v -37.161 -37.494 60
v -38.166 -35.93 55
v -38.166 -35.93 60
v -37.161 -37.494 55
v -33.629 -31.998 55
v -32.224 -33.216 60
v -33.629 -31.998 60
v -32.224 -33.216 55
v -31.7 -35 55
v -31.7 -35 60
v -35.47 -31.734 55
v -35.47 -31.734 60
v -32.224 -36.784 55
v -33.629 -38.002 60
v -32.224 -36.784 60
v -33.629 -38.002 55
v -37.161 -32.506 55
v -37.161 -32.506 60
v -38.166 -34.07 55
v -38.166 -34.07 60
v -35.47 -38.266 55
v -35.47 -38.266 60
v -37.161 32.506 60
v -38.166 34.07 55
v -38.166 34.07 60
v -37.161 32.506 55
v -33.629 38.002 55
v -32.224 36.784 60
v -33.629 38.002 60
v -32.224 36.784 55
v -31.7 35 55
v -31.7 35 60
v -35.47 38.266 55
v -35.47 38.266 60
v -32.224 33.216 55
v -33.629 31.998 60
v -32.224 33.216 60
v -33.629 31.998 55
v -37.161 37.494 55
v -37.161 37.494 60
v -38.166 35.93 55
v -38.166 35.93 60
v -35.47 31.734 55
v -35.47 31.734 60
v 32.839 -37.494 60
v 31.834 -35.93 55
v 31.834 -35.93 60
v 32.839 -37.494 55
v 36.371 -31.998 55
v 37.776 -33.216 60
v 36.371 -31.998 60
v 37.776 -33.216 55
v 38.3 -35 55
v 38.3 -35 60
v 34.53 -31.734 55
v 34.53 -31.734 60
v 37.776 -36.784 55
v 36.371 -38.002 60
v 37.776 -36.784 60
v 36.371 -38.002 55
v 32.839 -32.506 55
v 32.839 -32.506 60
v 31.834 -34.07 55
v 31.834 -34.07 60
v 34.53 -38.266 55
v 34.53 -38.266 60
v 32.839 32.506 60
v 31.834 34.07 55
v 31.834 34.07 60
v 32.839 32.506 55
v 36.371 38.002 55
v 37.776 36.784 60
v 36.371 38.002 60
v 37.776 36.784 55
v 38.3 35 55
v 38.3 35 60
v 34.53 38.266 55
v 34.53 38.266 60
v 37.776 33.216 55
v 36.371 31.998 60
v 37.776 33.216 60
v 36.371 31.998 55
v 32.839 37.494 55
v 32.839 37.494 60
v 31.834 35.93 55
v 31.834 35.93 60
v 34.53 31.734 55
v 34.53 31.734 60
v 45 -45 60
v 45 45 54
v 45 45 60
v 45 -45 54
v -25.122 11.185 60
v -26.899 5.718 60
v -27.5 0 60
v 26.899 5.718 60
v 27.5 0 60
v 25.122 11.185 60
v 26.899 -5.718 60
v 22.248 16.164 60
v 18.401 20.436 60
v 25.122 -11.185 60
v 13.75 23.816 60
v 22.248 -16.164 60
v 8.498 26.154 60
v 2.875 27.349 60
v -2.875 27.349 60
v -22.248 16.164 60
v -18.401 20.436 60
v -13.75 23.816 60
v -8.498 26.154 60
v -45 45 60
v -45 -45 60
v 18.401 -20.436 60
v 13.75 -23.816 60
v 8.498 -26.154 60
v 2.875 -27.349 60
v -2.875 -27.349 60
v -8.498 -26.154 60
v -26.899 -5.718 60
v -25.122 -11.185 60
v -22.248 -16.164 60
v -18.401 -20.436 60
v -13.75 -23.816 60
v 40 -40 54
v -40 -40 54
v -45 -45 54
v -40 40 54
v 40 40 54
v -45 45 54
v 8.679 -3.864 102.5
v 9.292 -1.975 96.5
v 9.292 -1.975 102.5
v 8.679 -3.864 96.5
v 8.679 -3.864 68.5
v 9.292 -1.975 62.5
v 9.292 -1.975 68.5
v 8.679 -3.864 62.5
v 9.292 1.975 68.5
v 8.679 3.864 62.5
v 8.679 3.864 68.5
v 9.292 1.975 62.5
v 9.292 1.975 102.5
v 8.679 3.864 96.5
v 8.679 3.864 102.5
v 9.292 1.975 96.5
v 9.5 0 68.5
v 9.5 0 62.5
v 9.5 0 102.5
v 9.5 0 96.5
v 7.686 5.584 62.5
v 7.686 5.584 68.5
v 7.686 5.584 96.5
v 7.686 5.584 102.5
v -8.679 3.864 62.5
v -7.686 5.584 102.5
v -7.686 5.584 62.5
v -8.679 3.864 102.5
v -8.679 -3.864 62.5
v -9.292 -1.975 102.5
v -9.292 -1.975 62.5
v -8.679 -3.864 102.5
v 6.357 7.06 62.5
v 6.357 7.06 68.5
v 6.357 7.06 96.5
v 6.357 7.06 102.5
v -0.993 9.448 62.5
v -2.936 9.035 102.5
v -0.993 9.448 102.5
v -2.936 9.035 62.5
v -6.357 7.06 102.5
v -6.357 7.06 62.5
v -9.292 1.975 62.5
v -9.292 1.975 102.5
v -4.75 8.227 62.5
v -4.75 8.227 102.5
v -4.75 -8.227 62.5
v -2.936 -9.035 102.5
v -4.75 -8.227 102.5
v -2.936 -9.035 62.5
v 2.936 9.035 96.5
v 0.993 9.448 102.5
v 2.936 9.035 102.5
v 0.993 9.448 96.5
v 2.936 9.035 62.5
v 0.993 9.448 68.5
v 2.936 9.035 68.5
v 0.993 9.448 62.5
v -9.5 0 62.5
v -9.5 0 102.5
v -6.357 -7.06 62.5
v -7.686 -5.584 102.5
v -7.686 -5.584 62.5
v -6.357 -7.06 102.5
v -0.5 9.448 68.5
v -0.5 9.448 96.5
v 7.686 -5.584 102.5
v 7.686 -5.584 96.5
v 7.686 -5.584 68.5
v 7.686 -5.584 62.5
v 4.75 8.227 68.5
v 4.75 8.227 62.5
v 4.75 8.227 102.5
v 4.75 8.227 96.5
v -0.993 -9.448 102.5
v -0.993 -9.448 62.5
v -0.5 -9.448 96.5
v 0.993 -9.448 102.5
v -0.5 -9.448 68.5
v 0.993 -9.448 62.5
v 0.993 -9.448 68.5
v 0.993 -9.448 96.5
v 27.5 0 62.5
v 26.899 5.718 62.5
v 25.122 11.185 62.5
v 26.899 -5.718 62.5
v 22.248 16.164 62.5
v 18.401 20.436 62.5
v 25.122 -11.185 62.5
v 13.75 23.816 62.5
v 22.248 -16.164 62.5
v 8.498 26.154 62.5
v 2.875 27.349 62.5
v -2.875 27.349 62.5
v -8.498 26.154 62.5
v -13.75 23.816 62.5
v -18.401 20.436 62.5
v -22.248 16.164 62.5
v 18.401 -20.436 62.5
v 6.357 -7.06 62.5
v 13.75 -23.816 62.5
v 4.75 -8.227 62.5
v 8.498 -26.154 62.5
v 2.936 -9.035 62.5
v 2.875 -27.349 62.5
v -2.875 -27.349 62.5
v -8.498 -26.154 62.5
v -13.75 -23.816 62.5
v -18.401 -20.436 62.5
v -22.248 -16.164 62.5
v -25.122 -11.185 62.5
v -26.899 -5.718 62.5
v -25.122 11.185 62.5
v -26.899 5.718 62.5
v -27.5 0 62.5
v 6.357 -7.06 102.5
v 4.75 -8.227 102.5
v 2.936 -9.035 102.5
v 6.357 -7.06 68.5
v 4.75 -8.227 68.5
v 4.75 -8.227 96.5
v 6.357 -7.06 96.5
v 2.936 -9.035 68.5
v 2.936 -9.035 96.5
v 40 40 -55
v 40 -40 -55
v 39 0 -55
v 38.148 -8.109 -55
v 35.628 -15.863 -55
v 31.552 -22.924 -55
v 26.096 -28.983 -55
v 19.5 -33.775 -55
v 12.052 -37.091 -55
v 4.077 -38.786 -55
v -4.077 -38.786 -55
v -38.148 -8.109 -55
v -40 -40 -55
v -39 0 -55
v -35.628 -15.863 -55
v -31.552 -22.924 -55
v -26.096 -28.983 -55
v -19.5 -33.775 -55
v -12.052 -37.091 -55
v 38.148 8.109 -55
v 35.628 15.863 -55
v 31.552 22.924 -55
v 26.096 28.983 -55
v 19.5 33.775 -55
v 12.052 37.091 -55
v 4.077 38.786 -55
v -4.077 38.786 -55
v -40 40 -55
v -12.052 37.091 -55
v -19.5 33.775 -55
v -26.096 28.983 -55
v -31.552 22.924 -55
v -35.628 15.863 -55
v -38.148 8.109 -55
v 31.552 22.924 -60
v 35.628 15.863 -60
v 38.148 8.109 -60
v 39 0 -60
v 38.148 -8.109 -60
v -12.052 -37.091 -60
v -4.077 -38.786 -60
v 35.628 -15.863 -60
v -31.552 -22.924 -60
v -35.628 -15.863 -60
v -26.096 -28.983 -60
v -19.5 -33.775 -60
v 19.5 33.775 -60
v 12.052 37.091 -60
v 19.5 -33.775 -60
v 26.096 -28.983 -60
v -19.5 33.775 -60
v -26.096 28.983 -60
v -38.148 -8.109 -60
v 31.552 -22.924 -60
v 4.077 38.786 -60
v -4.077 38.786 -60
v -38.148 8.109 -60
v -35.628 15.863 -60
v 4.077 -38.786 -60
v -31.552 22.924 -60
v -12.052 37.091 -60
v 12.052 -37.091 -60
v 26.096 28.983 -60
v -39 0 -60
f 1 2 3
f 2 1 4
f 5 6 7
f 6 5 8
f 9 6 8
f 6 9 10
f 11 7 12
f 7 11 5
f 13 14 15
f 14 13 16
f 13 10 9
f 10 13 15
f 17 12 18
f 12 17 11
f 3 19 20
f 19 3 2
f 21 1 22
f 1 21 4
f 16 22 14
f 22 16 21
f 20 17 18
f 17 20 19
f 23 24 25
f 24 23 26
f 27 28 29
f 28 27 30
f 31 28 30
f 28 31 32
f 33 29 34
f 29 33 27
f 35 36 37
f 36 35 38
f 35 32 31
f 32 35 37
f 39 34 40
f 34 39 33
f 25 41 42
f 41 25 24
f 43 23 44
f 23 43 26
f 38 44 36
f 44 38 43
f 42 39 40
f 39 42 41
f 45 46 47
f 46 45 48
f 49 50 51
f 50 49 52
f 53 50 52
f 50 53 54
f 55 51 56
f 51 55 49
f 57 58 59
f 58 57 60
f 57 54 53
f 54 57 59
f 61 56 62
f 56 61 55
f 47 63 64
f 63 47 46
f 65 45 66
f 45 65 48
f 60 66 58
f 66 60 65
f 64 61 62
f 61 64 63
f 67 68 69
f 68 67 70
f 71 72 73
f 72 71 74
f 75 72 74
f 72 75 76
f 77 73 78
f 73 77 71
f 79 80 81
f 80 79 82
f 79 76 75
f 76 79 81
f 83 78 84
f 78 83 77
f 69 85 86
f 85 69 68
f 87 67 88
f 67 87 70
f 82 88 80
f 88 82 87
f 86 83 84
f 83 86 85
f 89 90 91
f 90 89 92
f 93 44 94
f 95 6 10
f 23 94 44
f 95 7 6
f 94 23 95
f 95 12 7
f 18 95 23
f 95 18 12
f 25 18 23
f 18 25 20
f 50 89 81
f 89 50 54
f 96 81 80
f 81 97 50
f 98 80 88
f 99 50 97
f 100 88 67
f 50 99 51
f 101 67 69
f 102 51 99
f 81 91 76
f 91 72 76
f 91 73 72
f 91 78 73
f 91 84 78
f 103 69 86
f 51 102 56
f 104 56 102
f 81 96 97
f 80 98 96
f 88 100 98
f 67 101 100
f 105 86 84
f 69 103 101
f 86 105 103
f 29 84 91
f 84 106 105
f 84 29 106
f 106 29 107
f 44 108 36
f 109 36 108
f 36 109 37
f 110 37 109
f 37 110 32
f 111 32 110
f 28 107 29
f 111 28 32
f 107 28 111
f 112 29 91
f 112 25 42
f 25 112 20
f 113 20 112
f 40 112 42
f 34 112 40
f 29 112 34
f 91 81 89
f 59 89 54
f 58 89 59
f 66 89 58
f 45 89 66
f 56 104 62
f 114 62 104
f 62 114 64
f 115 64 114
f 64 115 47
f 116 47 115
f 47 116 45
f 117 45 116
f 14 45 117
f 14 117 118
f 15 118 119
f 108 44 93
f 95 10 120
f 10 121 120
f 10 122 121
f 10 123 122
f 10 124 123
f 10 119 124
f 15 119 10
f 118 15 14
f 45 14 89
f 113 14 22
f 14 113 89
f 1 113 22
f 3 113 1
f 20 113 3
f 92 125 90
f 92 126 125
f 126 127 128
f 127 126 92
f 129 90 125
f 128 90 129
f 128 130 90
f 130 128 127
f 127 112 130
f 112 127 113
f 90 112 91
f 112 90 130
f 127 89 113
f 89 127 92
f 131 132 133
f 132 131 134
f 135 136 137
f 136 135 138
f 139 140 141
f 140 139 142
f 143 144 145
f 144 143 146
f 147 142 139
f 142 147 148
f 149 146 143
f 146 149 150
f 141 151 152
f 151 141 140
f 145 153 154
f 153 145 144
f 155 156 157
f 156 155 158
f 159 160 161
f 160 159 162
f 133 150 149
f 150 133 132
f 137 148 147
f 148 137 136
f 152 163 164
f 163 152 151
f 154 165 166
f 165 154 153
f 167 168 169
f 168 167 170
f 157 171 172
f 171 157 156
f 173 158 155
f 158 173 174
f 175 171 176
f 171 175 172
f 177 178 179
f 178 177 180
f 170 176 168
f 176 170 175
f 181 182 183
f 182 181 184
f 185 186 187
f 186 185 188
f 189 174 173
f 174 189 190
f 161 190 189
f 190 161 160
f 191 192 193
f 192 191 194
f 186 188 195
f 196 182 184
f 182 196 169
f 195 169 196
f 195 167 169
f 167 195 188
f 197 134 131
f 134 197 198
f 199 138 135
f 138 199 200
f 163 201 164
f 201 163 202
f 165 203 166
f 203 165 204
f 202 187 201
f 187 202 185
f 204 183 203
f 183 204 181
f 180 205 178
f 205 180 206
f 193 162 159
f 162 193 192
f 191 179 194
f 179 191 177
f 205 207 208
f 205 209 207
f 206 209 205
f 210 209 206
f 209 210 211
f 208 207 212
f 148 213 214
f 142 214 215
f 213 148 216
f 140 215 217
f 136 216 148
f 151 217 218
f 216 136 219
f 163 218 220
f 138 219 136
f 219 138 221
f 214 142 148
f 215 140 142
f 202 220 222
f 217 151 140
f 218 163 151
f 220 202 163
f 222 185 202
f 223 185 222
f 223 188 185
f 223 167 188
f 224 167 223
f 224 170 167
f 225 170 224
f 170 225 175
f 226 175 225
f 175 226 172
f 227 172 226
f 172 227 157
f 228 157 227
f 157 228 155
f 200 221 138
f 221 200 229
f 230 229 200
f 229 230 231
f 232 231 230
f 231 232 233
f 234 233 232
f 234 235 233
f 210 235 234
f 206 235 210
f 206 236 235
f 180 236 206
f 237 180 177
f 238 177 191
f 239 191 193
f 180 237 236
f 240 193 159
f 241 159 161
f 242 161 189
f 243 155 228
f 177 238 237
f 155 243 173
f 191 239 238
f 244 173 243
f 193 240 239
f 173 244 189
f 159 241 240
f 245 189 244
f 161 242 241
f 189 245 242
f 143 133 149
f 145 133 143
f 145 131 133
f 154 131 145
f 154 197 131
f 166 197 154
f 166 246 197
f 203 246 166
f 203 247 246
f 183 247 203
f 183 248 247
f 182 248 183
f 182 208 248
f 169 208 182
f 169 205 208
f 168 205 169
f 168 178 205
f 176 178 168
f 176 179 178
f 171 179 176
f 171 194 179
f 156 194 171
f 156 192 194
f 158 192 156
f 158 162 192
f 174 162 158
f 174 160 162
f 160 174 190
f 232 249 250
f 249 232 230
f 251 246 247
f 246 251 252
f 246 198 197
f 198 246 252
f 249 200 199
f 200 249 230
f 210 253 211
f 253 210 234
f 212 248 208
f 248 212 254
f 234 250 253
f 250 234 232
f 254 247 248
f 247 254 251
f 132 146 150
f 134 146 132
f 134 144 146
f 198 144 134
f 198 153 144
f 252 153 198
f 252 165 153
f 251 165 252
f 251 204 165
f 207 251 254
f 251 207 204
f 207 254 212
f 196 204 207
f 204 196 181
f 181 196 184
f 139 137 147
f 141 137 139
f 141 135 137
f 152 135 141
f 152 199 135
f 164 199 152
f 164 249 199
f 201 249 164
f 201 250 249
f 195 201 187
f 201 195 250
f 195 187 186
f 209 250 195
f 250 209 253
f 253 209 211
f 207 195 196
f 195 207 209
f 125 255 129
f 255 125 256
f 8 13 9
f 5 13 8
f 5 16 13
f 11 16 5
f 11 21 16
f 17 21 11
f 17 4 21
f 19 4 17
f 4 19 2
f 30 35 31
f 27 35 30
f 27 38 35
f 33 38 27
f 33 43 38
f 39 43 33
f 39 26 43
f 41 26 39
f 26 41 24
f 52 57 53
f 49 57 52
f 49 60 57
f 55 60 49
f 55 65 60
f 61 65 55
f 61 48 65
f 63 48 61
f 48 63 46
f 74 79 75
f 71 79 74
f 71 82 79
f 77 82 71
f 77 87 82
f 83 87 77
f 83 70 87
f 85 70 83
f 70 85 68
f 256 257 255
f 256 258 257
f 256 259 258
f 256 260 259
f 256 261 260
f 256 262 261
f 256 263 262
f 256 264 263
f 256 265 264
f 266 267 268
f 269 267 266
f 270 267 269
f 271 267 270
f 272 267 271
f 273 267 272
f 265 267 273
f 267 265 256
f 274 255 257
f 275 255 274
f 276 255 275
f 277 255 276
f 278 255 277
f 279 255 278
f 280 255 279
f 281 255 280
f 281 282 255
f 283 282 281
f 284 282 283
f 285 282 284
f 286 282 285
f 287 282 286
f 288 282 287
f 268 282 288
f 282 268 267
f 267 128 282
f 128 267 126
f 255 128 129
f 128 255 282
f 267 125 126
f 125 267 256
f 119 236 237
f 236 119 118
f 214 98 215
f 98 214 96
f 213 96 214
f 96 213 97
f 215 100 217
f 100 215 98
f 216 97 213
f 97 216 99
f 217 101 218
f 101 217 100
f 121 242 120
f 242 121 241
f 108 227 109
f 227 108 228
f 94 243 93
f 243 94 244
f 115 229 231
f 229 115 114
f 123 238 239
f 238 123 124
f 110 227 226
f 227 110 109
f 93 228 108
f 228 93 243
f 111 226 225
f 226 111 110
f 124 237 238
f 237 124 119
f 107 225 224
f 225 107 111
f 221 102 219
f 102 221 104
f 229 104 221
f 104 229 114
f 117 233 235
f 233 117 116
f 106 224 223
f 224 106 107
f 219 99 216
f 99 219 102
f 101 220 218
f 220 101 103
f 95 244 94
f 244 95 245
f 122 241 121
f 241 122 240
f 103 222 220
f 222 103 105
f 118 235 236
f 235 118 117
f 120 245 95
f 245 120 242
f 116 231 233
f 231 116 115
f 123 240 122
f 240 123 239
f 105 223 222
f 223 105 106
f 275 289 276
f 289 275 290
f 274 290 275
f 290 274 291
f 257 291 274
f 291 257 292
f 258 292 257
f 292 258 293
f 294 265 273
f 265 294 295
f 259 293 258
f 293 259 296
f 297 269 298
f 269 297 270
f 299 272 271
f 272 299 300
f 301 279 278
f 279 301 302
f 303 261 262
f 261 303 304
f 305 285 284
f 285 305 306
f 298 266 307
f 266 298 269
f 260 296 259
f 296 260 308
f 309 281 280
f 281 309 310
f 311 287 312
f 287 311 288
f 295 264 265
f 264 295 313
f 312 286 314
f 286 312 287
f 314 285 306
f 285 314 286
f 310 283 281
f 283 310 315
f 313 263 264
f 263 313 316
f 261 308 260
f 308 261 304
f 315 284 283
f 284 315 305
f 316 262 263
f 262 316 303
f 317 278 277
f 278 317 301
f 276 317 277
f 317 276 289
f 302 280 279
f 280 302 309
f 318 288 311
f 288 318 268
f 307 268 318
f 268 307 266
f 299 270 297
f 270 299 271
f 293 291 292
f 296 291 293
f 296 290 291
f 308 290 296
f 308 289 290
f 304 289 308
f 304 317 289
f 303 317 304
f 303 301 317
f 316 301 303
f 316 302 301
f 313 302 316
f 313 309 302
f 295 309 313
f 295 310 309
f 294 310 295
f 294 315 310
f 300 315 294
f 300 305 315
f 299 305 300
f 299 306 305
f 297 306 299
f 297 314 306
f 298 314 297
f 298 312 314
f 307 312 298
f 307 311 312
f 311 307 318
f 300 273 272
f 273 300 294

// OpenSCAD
// Parameters
frame_size_mm = 80; //[40:160:1]
housing_length_mm = 110; //[55:220:1]
corner_radius_mm = 3; //[1:8:0.5]
flange_size_mm = 90; //[60:140:1]
flange_thickness_mm = 6; //[3:15:0.5]
pilot_diameter_mm = 55; //[30:90:0.5]
pilot_length_mm = 2.5; //[1:8:0.5]
mount_hole_count = 4; //[4:4:1]
mount_hole_diameter_mm = 6.6; //[3:12:0.1]
mount_hole_pitch_mm = 70; //[40:110:1]
shaft_diameter_mm = 19; //[8:35:0.5]
shaft_length_mm = 40; //[15:80:1]
shaft_flat_depth_mm = 1.0; //[0.2:3:0.1]
shaft_flat_length_mm = 28; //[10:60:1]
rear_endcap_thickness_mm = 6; //[3:15:0.5]
rear_endcap_diameter_mm = 78; //[50:120:1]
rear_connector_width_mm = 28; //[14:60:1]
rear_connector_height_mm = 18; //[10:40:1]
rear_connector_depth_mm = 16; //[8:40:1]
connector_offset_y_mm = 0; //[-20:20:1]
overlap_mm = 1; //[0.5:2:0.1]

// Servo Motor - complete geometry
module servo_motor() {
  // Main housing
  color([0.15, 0.2, 0.35]) {
    translate([0, 0, 0])
      cube([frame_size_mm, frame_size_mm, housing_length_mm], center=true);
  }
  
  // Front flange/faceplate
  color([0.15, 0.2, 0.35]) {
    translate([0, 0, housing_length_mm/2 + flange_thickness_mm/2 - overlap_mm])
      difference() {
        cube([flange_size_mm, flange_size_mm, flange_thickness_mm], center=true);
        // Mounting holes
        for (x = [-1, 1], y = [-1, 1]) {
          translate([x * mount_hole_pitch_mm/2, y * mount_hole_pitch_mm/2, 0])
            cylinder(r=mount_hole_diameter_mm/2, h=flange_thickness_mm + overlap_mm*2, center=true);
        }
      }
  }
  
  // Front pilot boss
  color([0.15, 0.2, 0.35]) {
    translate([0, 0, housing_length_mm/2 + flange_thickness_mm + pilot_length_mm/2 - overlap_mm])
      cylinder(r=pilot_diameter_mm/2, h=pilot_length_mm, center=true);
  }
  
  // Output shaft with flat
  color("Silver") {
    translate([0, 0, housing_length_mm/2 + flange_thickness_mm + pilot_length_mm + shaft_length_mm/2 - overlap_mm])
      difference() {
        cylinder(r=shaft_diameter_mm/2, h=shaft_length_mm, center=true);
        translate([shaft_diameter_mm/2 - shaft_flat_depth_mm + overlap_mm/2, 0, 0])
          cube([shaft_diameter_mm, shaft_diameter_mm*2, shaft_flat_length_mm], center=true);
      }
  }
  
  // Rear endcap
  color([0.15, 0.2, 0.35]) {
    translate([0, 0, -housing_length_mm/2 - rear_endcap_thickness_mm/2 + overlap_mm])
      cylinder(r=rear_endcap_diameter_mm/2, h=rear_endcap_thickness_mm, center=true);
  }
  
  // Cable connector block
  color([0.15, 0.2, 0.35]) {
    translate([0, connector_offset_y_mm, -housing_length_mm/2 - rear_endcap_thickness_mm + rear_connector_height_mm/2 + overlap_mm])
      cube([rear_connector_width_mm, rear_connector_depth_mm, rear_connector_height_mm], center=true);
  }
}

// Assembly
module assembly() {
  servo_motor();
}

assembly();
